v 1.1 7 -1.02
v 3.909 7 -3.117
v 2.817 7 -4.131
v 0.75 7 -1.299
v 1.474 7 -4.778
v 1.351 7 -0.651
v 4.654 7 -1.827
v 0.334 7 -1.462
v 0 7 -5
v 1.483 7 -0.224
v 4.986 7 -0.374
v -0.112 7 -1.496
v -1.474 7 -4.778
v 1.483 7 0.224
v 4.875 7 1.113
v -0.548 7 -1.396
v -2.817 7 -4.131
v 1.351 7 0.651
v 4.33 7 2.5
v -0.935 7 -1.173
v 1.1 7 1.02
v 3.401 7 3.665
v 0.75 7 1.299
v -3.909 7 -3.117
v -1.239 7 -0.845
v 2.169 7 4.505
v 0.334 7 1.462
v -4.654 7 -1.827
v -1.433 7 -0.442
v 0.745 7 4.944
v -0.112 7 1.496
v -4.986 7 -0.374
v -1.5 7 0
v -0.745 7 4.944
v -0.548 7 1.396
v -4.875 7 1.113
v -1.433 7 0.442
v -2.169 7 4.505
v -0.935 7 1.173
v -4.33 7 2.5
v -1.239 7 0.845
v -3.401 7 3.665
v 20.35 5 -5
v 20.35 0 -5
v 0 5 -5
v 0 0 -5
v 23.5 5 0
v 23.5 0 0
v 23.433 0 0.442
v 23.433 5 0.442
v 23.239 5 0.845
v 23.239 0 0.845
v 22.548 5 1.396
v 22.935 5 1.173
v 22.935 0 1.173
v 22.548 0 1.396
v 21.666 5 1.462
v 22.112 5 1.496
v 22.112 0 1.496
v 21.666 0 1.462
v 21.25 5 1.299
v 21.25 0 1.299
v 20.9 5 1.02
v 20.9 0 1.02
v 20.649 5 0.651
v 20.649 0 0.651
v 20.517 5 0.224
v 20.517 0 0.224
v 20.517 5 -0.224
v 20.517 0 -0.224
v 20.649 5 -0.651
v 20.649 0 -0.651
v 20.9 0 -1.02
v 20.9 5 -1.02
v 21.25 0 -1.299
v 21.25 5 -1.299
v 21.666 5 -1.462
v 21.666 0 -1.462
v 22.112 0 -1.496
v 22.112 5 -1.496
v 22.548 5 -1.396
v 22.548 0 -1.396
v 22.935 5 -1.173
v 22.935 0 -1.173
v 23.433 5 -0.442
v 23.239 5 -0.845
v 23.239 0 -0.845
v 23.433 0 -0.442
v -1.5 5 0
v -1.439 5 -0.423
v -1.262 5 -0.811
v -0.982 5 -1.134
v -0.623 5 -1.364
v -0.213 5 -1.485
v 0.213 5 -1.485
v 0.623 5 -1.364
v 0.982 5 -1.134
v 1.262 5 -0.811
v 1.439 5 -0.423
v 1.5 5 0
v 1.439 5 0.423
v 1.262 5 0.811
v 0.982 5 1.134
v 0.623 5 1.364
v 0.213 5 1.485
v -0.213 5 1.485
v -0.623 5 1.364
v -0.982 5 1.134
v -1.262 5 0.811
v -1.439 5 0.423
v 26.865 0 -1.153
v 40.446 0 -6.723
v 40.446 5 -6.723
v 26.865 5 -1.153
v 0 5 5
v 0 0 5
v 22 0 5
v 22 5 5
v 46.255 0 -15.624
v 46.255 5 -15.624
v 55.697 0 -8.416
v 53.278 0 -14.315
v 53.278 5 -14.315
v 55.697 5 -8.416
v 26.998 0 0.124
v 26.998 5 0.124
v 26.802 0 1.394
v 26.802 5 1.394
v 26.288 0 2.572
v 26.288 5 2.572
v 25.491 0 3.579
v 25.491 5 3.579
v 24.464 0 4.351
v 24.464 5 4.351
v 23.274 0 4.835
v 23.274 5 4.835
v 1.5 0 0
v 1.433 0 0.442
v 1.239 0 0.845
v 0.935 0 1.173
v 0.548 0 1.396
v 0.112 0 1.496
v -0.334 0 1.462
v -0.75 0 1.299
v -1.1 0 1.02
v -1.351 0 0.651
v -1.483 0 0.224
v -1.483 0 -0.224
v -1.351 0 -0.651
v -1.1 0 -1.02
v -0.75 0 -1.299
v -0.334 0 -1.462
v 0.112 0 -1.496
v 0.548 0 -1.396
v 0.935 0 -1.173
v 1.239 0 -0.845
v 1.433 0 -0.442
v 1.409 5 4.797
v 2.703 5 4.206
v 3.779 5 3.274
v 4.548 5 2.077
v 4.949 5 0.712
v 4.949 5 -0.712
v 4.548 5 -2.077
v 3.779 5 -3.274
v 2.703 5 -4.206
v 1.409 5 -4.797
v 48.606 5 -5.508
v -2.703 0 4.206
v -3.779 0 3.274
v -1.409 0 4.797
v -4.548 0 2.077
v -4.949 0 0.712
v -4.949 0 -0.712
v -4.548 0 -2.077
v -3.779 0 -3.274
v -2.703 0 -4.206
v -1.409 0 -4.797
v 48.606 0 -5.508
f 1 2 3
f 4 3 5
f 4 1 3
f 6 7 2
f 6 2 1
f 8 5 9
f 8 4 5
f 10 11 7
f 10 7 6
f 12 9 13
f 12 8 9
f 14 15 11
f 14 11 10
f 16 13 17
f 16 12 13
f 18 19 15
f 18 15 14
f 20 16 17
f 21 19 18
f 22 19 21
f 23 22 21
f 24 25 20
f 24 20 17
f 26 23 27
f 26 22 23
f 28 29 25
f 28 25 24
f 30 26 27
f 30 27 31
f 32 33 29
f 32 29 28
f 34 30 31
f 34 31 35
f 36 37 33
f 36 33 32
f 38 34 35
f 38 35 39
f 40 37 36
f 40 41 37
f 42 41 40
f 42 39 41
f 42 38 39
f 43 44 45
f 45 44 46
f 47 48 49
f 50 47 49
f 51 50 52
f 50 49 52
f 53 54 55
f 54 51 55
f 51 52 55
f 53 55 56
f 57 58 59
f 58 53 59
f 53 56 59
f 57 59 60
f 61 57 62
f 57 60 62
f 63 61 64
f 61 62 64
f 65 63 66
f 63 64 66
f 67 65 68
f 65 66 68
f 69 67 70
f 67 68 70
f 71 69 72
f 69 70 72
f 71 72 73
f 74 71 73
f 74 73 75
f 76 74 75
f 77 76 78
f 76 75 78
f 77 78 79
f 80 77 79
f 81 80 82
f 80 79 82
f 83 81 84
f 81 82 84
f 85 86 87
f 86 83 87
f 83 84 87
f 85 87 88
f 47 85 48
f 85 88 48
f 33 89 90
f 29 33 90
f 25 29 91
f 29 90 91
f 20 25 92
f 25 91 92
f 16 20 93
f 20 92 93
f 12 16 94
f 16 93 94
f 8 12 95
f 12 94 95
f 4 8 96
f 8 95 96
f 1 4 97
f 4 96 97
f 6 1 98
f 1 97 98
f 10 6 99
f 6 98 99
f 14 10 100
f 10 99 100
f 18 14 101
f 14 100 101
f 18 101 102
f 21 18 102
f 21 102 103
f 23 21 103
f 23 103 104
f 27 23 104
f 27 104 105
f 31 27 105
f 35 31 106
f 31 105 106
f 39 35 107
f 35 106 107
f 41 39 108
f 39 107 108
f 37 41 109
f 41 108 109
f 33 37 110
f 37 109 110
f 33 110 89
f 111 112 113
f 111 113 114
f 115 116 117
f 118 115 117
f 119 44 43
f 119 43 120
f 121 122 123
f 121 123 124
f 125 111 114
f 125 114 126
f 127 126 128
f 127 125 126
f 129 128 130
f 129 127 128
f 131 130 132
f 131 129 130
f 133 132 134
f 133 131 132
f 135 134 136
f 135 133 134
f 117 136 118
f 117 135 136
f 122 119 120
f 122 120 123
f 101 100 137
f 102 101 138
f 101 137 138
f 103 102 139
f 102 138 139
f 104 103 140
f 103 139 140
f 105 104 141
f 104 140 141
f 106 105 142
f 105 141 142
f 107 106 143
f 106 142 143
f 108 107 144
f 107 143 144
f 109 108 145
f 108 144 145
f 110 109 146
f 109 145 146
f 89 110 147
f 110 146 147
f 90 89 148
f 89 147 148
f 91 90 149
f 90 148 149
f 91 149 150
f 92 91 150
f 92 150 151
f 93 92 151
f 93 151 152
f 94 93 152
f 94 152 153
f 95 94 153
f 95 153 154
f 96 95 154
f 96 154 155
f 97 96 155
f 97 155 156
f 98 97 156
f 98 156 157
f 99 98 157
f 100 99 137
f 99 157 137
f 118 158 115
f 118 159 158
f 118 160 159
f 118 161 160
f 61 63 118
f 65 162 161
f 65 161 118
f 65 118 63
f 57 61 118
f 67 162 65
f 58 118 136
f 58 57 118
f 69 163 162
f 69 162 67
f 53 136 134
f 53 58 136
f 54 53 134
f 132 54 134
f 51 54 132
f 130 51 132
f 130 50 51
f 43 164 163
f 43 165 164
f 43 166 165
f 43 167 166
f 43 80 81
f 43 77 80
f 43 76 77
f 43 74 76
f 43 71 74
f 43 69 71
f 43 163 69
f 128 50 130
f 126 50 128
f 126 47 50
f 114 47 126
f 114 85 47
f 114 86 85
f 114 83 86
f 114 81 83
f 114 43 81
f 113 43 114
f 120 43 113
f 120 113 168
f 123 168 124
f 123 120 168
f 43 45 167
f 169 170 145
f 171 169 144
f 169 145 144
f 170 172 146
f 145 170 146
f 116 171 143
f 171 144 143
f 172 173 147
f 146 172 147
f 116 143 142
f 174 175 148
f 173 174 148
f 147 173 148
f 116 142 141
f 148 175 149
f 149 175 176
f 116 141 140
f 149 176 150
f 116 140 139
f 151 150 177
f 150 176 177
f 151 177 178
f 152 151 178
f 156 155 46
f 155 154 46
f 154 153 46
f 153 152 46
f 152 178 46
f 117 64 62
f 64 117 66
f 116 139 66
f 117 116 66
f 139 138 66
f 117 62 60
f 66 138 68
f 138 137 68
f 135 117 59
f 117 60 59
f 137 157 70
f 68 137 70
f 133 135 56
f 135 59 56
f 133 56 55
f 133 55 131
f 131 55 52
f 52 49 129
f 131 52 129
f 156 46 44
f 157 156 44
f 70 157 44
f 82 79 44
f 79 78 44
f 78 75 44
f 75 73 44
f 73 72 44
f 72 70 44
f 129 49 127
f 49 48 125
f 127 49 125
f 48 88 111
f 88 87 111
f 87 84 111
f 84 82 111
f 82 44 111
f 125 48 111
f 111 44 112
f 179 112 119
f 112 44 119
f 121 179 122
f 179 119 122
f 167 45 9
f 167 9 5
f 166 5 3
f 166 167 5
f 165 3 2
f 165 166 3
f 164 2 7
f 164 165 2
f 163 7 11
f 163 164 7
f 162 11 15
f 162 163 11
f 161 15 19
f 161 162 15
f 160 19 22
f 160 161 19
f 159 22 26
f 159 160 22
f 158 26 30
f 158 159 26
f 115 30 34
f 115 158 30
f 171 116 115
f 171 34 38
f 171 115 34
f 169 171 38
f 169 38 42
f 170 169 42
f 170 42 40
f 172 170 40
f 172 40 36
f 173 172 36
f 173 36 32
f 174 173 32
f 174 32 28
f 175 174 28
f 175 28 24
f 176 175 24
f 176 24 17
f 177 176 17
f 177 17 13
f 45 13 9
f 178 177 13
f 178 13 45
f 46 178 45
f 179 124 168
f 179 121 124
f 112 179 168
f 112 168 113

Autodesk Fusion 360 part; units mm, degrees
sketch "Sketch1" plane through (0, 0, 0) normal (0, 1, 0) x (1, 0, 0)
  line L0 (0, -5) -> (22, -5)
  arc A0 (22, -5) -> (22, 5) centre (22, 0) ccw
  line L1 (22, 5) -> (0, 5)
  arc A1 (0, 5) -> (0, -5) centre (0, 0) ccw
  line L2 (0, 0) -> (22, 0) construction
  circle A2 centre (0, 0) radius 1.5
  line L3 (20.35, 5) -> (51.8071, 17.9015)
  line L4 (51.8071, 17.9015) -> (55.6974, 8.4161)
  line L5 (55.6974, 8.4161) -> (23.8973, -4.626)
  line L6 (46.255, 15.6244) -> (53.278, 14.3153)
  line L7 (48.6059, 5.5077) -> (40.4462, 6.7233)
  line L8 (40.4462, 6.7233) -> (26.8652, 1.1533)
  circle A3 centre (22, 0) radius 1.5
  dimension "d1" = 22
  dimension "d3" = 5
  dimension "d4" = 3
  dimension "d5" = 157.7
  dimension "d6" = 34
  dimension "d7" = 1.65
  dimension "d8" = 3
extrude "Extrude1" add sketch "Sketch1" along normal blind 5 contours L0 A0 L1 A1 | A0 L1 L3 L4 L5 L6 L7 L8
sketch "Sketch2" plane through (0, 0, 0) normal (0, 1, 0) x (1, 0, 0)
sketch "Sketch3" plane through (0, 5, 0) normal (0, 1, 0) x (-1, 0, 0)
  circle A0 centre (0, 0) radius 1.5
  circle A1 centre (-22, 0) radius 1.5
  line L0 (-20.35, -5) -> (0, -5)
  arc A2 (0, -5) -> (0, 5) centre (0, 0) ccw
  line L1 (0, 5) -> (-22, 5)
  arc A3 (-22, 5) -> (-26.8652, -1.1533) centre (-22, 0) ccw
  line L2 (-26.8652, -1.1533) -> (-40.4462, -6.7233)
  line L3 (-40.4462, -6.7233) -> (-48.6059, -5.5077)
  line L4 (-48.6059, -5.5077) -> (-55.6974, -8.4161)
  line L5 (-55.6974, -8.4161) -> (-53.278, -14.3153)
  line L6 (-53.278, -14.3153) -> (-46.255, -15.6244)
  line L7 (-46.255, -15.6244) -> (-20.35, -5)
  circle A4 centre (0, 0) radius 5
  dimension "d11" = 10
extrude "Extrude2" add sketch "Sketch3" along normal blind 2 contours A2 A4
